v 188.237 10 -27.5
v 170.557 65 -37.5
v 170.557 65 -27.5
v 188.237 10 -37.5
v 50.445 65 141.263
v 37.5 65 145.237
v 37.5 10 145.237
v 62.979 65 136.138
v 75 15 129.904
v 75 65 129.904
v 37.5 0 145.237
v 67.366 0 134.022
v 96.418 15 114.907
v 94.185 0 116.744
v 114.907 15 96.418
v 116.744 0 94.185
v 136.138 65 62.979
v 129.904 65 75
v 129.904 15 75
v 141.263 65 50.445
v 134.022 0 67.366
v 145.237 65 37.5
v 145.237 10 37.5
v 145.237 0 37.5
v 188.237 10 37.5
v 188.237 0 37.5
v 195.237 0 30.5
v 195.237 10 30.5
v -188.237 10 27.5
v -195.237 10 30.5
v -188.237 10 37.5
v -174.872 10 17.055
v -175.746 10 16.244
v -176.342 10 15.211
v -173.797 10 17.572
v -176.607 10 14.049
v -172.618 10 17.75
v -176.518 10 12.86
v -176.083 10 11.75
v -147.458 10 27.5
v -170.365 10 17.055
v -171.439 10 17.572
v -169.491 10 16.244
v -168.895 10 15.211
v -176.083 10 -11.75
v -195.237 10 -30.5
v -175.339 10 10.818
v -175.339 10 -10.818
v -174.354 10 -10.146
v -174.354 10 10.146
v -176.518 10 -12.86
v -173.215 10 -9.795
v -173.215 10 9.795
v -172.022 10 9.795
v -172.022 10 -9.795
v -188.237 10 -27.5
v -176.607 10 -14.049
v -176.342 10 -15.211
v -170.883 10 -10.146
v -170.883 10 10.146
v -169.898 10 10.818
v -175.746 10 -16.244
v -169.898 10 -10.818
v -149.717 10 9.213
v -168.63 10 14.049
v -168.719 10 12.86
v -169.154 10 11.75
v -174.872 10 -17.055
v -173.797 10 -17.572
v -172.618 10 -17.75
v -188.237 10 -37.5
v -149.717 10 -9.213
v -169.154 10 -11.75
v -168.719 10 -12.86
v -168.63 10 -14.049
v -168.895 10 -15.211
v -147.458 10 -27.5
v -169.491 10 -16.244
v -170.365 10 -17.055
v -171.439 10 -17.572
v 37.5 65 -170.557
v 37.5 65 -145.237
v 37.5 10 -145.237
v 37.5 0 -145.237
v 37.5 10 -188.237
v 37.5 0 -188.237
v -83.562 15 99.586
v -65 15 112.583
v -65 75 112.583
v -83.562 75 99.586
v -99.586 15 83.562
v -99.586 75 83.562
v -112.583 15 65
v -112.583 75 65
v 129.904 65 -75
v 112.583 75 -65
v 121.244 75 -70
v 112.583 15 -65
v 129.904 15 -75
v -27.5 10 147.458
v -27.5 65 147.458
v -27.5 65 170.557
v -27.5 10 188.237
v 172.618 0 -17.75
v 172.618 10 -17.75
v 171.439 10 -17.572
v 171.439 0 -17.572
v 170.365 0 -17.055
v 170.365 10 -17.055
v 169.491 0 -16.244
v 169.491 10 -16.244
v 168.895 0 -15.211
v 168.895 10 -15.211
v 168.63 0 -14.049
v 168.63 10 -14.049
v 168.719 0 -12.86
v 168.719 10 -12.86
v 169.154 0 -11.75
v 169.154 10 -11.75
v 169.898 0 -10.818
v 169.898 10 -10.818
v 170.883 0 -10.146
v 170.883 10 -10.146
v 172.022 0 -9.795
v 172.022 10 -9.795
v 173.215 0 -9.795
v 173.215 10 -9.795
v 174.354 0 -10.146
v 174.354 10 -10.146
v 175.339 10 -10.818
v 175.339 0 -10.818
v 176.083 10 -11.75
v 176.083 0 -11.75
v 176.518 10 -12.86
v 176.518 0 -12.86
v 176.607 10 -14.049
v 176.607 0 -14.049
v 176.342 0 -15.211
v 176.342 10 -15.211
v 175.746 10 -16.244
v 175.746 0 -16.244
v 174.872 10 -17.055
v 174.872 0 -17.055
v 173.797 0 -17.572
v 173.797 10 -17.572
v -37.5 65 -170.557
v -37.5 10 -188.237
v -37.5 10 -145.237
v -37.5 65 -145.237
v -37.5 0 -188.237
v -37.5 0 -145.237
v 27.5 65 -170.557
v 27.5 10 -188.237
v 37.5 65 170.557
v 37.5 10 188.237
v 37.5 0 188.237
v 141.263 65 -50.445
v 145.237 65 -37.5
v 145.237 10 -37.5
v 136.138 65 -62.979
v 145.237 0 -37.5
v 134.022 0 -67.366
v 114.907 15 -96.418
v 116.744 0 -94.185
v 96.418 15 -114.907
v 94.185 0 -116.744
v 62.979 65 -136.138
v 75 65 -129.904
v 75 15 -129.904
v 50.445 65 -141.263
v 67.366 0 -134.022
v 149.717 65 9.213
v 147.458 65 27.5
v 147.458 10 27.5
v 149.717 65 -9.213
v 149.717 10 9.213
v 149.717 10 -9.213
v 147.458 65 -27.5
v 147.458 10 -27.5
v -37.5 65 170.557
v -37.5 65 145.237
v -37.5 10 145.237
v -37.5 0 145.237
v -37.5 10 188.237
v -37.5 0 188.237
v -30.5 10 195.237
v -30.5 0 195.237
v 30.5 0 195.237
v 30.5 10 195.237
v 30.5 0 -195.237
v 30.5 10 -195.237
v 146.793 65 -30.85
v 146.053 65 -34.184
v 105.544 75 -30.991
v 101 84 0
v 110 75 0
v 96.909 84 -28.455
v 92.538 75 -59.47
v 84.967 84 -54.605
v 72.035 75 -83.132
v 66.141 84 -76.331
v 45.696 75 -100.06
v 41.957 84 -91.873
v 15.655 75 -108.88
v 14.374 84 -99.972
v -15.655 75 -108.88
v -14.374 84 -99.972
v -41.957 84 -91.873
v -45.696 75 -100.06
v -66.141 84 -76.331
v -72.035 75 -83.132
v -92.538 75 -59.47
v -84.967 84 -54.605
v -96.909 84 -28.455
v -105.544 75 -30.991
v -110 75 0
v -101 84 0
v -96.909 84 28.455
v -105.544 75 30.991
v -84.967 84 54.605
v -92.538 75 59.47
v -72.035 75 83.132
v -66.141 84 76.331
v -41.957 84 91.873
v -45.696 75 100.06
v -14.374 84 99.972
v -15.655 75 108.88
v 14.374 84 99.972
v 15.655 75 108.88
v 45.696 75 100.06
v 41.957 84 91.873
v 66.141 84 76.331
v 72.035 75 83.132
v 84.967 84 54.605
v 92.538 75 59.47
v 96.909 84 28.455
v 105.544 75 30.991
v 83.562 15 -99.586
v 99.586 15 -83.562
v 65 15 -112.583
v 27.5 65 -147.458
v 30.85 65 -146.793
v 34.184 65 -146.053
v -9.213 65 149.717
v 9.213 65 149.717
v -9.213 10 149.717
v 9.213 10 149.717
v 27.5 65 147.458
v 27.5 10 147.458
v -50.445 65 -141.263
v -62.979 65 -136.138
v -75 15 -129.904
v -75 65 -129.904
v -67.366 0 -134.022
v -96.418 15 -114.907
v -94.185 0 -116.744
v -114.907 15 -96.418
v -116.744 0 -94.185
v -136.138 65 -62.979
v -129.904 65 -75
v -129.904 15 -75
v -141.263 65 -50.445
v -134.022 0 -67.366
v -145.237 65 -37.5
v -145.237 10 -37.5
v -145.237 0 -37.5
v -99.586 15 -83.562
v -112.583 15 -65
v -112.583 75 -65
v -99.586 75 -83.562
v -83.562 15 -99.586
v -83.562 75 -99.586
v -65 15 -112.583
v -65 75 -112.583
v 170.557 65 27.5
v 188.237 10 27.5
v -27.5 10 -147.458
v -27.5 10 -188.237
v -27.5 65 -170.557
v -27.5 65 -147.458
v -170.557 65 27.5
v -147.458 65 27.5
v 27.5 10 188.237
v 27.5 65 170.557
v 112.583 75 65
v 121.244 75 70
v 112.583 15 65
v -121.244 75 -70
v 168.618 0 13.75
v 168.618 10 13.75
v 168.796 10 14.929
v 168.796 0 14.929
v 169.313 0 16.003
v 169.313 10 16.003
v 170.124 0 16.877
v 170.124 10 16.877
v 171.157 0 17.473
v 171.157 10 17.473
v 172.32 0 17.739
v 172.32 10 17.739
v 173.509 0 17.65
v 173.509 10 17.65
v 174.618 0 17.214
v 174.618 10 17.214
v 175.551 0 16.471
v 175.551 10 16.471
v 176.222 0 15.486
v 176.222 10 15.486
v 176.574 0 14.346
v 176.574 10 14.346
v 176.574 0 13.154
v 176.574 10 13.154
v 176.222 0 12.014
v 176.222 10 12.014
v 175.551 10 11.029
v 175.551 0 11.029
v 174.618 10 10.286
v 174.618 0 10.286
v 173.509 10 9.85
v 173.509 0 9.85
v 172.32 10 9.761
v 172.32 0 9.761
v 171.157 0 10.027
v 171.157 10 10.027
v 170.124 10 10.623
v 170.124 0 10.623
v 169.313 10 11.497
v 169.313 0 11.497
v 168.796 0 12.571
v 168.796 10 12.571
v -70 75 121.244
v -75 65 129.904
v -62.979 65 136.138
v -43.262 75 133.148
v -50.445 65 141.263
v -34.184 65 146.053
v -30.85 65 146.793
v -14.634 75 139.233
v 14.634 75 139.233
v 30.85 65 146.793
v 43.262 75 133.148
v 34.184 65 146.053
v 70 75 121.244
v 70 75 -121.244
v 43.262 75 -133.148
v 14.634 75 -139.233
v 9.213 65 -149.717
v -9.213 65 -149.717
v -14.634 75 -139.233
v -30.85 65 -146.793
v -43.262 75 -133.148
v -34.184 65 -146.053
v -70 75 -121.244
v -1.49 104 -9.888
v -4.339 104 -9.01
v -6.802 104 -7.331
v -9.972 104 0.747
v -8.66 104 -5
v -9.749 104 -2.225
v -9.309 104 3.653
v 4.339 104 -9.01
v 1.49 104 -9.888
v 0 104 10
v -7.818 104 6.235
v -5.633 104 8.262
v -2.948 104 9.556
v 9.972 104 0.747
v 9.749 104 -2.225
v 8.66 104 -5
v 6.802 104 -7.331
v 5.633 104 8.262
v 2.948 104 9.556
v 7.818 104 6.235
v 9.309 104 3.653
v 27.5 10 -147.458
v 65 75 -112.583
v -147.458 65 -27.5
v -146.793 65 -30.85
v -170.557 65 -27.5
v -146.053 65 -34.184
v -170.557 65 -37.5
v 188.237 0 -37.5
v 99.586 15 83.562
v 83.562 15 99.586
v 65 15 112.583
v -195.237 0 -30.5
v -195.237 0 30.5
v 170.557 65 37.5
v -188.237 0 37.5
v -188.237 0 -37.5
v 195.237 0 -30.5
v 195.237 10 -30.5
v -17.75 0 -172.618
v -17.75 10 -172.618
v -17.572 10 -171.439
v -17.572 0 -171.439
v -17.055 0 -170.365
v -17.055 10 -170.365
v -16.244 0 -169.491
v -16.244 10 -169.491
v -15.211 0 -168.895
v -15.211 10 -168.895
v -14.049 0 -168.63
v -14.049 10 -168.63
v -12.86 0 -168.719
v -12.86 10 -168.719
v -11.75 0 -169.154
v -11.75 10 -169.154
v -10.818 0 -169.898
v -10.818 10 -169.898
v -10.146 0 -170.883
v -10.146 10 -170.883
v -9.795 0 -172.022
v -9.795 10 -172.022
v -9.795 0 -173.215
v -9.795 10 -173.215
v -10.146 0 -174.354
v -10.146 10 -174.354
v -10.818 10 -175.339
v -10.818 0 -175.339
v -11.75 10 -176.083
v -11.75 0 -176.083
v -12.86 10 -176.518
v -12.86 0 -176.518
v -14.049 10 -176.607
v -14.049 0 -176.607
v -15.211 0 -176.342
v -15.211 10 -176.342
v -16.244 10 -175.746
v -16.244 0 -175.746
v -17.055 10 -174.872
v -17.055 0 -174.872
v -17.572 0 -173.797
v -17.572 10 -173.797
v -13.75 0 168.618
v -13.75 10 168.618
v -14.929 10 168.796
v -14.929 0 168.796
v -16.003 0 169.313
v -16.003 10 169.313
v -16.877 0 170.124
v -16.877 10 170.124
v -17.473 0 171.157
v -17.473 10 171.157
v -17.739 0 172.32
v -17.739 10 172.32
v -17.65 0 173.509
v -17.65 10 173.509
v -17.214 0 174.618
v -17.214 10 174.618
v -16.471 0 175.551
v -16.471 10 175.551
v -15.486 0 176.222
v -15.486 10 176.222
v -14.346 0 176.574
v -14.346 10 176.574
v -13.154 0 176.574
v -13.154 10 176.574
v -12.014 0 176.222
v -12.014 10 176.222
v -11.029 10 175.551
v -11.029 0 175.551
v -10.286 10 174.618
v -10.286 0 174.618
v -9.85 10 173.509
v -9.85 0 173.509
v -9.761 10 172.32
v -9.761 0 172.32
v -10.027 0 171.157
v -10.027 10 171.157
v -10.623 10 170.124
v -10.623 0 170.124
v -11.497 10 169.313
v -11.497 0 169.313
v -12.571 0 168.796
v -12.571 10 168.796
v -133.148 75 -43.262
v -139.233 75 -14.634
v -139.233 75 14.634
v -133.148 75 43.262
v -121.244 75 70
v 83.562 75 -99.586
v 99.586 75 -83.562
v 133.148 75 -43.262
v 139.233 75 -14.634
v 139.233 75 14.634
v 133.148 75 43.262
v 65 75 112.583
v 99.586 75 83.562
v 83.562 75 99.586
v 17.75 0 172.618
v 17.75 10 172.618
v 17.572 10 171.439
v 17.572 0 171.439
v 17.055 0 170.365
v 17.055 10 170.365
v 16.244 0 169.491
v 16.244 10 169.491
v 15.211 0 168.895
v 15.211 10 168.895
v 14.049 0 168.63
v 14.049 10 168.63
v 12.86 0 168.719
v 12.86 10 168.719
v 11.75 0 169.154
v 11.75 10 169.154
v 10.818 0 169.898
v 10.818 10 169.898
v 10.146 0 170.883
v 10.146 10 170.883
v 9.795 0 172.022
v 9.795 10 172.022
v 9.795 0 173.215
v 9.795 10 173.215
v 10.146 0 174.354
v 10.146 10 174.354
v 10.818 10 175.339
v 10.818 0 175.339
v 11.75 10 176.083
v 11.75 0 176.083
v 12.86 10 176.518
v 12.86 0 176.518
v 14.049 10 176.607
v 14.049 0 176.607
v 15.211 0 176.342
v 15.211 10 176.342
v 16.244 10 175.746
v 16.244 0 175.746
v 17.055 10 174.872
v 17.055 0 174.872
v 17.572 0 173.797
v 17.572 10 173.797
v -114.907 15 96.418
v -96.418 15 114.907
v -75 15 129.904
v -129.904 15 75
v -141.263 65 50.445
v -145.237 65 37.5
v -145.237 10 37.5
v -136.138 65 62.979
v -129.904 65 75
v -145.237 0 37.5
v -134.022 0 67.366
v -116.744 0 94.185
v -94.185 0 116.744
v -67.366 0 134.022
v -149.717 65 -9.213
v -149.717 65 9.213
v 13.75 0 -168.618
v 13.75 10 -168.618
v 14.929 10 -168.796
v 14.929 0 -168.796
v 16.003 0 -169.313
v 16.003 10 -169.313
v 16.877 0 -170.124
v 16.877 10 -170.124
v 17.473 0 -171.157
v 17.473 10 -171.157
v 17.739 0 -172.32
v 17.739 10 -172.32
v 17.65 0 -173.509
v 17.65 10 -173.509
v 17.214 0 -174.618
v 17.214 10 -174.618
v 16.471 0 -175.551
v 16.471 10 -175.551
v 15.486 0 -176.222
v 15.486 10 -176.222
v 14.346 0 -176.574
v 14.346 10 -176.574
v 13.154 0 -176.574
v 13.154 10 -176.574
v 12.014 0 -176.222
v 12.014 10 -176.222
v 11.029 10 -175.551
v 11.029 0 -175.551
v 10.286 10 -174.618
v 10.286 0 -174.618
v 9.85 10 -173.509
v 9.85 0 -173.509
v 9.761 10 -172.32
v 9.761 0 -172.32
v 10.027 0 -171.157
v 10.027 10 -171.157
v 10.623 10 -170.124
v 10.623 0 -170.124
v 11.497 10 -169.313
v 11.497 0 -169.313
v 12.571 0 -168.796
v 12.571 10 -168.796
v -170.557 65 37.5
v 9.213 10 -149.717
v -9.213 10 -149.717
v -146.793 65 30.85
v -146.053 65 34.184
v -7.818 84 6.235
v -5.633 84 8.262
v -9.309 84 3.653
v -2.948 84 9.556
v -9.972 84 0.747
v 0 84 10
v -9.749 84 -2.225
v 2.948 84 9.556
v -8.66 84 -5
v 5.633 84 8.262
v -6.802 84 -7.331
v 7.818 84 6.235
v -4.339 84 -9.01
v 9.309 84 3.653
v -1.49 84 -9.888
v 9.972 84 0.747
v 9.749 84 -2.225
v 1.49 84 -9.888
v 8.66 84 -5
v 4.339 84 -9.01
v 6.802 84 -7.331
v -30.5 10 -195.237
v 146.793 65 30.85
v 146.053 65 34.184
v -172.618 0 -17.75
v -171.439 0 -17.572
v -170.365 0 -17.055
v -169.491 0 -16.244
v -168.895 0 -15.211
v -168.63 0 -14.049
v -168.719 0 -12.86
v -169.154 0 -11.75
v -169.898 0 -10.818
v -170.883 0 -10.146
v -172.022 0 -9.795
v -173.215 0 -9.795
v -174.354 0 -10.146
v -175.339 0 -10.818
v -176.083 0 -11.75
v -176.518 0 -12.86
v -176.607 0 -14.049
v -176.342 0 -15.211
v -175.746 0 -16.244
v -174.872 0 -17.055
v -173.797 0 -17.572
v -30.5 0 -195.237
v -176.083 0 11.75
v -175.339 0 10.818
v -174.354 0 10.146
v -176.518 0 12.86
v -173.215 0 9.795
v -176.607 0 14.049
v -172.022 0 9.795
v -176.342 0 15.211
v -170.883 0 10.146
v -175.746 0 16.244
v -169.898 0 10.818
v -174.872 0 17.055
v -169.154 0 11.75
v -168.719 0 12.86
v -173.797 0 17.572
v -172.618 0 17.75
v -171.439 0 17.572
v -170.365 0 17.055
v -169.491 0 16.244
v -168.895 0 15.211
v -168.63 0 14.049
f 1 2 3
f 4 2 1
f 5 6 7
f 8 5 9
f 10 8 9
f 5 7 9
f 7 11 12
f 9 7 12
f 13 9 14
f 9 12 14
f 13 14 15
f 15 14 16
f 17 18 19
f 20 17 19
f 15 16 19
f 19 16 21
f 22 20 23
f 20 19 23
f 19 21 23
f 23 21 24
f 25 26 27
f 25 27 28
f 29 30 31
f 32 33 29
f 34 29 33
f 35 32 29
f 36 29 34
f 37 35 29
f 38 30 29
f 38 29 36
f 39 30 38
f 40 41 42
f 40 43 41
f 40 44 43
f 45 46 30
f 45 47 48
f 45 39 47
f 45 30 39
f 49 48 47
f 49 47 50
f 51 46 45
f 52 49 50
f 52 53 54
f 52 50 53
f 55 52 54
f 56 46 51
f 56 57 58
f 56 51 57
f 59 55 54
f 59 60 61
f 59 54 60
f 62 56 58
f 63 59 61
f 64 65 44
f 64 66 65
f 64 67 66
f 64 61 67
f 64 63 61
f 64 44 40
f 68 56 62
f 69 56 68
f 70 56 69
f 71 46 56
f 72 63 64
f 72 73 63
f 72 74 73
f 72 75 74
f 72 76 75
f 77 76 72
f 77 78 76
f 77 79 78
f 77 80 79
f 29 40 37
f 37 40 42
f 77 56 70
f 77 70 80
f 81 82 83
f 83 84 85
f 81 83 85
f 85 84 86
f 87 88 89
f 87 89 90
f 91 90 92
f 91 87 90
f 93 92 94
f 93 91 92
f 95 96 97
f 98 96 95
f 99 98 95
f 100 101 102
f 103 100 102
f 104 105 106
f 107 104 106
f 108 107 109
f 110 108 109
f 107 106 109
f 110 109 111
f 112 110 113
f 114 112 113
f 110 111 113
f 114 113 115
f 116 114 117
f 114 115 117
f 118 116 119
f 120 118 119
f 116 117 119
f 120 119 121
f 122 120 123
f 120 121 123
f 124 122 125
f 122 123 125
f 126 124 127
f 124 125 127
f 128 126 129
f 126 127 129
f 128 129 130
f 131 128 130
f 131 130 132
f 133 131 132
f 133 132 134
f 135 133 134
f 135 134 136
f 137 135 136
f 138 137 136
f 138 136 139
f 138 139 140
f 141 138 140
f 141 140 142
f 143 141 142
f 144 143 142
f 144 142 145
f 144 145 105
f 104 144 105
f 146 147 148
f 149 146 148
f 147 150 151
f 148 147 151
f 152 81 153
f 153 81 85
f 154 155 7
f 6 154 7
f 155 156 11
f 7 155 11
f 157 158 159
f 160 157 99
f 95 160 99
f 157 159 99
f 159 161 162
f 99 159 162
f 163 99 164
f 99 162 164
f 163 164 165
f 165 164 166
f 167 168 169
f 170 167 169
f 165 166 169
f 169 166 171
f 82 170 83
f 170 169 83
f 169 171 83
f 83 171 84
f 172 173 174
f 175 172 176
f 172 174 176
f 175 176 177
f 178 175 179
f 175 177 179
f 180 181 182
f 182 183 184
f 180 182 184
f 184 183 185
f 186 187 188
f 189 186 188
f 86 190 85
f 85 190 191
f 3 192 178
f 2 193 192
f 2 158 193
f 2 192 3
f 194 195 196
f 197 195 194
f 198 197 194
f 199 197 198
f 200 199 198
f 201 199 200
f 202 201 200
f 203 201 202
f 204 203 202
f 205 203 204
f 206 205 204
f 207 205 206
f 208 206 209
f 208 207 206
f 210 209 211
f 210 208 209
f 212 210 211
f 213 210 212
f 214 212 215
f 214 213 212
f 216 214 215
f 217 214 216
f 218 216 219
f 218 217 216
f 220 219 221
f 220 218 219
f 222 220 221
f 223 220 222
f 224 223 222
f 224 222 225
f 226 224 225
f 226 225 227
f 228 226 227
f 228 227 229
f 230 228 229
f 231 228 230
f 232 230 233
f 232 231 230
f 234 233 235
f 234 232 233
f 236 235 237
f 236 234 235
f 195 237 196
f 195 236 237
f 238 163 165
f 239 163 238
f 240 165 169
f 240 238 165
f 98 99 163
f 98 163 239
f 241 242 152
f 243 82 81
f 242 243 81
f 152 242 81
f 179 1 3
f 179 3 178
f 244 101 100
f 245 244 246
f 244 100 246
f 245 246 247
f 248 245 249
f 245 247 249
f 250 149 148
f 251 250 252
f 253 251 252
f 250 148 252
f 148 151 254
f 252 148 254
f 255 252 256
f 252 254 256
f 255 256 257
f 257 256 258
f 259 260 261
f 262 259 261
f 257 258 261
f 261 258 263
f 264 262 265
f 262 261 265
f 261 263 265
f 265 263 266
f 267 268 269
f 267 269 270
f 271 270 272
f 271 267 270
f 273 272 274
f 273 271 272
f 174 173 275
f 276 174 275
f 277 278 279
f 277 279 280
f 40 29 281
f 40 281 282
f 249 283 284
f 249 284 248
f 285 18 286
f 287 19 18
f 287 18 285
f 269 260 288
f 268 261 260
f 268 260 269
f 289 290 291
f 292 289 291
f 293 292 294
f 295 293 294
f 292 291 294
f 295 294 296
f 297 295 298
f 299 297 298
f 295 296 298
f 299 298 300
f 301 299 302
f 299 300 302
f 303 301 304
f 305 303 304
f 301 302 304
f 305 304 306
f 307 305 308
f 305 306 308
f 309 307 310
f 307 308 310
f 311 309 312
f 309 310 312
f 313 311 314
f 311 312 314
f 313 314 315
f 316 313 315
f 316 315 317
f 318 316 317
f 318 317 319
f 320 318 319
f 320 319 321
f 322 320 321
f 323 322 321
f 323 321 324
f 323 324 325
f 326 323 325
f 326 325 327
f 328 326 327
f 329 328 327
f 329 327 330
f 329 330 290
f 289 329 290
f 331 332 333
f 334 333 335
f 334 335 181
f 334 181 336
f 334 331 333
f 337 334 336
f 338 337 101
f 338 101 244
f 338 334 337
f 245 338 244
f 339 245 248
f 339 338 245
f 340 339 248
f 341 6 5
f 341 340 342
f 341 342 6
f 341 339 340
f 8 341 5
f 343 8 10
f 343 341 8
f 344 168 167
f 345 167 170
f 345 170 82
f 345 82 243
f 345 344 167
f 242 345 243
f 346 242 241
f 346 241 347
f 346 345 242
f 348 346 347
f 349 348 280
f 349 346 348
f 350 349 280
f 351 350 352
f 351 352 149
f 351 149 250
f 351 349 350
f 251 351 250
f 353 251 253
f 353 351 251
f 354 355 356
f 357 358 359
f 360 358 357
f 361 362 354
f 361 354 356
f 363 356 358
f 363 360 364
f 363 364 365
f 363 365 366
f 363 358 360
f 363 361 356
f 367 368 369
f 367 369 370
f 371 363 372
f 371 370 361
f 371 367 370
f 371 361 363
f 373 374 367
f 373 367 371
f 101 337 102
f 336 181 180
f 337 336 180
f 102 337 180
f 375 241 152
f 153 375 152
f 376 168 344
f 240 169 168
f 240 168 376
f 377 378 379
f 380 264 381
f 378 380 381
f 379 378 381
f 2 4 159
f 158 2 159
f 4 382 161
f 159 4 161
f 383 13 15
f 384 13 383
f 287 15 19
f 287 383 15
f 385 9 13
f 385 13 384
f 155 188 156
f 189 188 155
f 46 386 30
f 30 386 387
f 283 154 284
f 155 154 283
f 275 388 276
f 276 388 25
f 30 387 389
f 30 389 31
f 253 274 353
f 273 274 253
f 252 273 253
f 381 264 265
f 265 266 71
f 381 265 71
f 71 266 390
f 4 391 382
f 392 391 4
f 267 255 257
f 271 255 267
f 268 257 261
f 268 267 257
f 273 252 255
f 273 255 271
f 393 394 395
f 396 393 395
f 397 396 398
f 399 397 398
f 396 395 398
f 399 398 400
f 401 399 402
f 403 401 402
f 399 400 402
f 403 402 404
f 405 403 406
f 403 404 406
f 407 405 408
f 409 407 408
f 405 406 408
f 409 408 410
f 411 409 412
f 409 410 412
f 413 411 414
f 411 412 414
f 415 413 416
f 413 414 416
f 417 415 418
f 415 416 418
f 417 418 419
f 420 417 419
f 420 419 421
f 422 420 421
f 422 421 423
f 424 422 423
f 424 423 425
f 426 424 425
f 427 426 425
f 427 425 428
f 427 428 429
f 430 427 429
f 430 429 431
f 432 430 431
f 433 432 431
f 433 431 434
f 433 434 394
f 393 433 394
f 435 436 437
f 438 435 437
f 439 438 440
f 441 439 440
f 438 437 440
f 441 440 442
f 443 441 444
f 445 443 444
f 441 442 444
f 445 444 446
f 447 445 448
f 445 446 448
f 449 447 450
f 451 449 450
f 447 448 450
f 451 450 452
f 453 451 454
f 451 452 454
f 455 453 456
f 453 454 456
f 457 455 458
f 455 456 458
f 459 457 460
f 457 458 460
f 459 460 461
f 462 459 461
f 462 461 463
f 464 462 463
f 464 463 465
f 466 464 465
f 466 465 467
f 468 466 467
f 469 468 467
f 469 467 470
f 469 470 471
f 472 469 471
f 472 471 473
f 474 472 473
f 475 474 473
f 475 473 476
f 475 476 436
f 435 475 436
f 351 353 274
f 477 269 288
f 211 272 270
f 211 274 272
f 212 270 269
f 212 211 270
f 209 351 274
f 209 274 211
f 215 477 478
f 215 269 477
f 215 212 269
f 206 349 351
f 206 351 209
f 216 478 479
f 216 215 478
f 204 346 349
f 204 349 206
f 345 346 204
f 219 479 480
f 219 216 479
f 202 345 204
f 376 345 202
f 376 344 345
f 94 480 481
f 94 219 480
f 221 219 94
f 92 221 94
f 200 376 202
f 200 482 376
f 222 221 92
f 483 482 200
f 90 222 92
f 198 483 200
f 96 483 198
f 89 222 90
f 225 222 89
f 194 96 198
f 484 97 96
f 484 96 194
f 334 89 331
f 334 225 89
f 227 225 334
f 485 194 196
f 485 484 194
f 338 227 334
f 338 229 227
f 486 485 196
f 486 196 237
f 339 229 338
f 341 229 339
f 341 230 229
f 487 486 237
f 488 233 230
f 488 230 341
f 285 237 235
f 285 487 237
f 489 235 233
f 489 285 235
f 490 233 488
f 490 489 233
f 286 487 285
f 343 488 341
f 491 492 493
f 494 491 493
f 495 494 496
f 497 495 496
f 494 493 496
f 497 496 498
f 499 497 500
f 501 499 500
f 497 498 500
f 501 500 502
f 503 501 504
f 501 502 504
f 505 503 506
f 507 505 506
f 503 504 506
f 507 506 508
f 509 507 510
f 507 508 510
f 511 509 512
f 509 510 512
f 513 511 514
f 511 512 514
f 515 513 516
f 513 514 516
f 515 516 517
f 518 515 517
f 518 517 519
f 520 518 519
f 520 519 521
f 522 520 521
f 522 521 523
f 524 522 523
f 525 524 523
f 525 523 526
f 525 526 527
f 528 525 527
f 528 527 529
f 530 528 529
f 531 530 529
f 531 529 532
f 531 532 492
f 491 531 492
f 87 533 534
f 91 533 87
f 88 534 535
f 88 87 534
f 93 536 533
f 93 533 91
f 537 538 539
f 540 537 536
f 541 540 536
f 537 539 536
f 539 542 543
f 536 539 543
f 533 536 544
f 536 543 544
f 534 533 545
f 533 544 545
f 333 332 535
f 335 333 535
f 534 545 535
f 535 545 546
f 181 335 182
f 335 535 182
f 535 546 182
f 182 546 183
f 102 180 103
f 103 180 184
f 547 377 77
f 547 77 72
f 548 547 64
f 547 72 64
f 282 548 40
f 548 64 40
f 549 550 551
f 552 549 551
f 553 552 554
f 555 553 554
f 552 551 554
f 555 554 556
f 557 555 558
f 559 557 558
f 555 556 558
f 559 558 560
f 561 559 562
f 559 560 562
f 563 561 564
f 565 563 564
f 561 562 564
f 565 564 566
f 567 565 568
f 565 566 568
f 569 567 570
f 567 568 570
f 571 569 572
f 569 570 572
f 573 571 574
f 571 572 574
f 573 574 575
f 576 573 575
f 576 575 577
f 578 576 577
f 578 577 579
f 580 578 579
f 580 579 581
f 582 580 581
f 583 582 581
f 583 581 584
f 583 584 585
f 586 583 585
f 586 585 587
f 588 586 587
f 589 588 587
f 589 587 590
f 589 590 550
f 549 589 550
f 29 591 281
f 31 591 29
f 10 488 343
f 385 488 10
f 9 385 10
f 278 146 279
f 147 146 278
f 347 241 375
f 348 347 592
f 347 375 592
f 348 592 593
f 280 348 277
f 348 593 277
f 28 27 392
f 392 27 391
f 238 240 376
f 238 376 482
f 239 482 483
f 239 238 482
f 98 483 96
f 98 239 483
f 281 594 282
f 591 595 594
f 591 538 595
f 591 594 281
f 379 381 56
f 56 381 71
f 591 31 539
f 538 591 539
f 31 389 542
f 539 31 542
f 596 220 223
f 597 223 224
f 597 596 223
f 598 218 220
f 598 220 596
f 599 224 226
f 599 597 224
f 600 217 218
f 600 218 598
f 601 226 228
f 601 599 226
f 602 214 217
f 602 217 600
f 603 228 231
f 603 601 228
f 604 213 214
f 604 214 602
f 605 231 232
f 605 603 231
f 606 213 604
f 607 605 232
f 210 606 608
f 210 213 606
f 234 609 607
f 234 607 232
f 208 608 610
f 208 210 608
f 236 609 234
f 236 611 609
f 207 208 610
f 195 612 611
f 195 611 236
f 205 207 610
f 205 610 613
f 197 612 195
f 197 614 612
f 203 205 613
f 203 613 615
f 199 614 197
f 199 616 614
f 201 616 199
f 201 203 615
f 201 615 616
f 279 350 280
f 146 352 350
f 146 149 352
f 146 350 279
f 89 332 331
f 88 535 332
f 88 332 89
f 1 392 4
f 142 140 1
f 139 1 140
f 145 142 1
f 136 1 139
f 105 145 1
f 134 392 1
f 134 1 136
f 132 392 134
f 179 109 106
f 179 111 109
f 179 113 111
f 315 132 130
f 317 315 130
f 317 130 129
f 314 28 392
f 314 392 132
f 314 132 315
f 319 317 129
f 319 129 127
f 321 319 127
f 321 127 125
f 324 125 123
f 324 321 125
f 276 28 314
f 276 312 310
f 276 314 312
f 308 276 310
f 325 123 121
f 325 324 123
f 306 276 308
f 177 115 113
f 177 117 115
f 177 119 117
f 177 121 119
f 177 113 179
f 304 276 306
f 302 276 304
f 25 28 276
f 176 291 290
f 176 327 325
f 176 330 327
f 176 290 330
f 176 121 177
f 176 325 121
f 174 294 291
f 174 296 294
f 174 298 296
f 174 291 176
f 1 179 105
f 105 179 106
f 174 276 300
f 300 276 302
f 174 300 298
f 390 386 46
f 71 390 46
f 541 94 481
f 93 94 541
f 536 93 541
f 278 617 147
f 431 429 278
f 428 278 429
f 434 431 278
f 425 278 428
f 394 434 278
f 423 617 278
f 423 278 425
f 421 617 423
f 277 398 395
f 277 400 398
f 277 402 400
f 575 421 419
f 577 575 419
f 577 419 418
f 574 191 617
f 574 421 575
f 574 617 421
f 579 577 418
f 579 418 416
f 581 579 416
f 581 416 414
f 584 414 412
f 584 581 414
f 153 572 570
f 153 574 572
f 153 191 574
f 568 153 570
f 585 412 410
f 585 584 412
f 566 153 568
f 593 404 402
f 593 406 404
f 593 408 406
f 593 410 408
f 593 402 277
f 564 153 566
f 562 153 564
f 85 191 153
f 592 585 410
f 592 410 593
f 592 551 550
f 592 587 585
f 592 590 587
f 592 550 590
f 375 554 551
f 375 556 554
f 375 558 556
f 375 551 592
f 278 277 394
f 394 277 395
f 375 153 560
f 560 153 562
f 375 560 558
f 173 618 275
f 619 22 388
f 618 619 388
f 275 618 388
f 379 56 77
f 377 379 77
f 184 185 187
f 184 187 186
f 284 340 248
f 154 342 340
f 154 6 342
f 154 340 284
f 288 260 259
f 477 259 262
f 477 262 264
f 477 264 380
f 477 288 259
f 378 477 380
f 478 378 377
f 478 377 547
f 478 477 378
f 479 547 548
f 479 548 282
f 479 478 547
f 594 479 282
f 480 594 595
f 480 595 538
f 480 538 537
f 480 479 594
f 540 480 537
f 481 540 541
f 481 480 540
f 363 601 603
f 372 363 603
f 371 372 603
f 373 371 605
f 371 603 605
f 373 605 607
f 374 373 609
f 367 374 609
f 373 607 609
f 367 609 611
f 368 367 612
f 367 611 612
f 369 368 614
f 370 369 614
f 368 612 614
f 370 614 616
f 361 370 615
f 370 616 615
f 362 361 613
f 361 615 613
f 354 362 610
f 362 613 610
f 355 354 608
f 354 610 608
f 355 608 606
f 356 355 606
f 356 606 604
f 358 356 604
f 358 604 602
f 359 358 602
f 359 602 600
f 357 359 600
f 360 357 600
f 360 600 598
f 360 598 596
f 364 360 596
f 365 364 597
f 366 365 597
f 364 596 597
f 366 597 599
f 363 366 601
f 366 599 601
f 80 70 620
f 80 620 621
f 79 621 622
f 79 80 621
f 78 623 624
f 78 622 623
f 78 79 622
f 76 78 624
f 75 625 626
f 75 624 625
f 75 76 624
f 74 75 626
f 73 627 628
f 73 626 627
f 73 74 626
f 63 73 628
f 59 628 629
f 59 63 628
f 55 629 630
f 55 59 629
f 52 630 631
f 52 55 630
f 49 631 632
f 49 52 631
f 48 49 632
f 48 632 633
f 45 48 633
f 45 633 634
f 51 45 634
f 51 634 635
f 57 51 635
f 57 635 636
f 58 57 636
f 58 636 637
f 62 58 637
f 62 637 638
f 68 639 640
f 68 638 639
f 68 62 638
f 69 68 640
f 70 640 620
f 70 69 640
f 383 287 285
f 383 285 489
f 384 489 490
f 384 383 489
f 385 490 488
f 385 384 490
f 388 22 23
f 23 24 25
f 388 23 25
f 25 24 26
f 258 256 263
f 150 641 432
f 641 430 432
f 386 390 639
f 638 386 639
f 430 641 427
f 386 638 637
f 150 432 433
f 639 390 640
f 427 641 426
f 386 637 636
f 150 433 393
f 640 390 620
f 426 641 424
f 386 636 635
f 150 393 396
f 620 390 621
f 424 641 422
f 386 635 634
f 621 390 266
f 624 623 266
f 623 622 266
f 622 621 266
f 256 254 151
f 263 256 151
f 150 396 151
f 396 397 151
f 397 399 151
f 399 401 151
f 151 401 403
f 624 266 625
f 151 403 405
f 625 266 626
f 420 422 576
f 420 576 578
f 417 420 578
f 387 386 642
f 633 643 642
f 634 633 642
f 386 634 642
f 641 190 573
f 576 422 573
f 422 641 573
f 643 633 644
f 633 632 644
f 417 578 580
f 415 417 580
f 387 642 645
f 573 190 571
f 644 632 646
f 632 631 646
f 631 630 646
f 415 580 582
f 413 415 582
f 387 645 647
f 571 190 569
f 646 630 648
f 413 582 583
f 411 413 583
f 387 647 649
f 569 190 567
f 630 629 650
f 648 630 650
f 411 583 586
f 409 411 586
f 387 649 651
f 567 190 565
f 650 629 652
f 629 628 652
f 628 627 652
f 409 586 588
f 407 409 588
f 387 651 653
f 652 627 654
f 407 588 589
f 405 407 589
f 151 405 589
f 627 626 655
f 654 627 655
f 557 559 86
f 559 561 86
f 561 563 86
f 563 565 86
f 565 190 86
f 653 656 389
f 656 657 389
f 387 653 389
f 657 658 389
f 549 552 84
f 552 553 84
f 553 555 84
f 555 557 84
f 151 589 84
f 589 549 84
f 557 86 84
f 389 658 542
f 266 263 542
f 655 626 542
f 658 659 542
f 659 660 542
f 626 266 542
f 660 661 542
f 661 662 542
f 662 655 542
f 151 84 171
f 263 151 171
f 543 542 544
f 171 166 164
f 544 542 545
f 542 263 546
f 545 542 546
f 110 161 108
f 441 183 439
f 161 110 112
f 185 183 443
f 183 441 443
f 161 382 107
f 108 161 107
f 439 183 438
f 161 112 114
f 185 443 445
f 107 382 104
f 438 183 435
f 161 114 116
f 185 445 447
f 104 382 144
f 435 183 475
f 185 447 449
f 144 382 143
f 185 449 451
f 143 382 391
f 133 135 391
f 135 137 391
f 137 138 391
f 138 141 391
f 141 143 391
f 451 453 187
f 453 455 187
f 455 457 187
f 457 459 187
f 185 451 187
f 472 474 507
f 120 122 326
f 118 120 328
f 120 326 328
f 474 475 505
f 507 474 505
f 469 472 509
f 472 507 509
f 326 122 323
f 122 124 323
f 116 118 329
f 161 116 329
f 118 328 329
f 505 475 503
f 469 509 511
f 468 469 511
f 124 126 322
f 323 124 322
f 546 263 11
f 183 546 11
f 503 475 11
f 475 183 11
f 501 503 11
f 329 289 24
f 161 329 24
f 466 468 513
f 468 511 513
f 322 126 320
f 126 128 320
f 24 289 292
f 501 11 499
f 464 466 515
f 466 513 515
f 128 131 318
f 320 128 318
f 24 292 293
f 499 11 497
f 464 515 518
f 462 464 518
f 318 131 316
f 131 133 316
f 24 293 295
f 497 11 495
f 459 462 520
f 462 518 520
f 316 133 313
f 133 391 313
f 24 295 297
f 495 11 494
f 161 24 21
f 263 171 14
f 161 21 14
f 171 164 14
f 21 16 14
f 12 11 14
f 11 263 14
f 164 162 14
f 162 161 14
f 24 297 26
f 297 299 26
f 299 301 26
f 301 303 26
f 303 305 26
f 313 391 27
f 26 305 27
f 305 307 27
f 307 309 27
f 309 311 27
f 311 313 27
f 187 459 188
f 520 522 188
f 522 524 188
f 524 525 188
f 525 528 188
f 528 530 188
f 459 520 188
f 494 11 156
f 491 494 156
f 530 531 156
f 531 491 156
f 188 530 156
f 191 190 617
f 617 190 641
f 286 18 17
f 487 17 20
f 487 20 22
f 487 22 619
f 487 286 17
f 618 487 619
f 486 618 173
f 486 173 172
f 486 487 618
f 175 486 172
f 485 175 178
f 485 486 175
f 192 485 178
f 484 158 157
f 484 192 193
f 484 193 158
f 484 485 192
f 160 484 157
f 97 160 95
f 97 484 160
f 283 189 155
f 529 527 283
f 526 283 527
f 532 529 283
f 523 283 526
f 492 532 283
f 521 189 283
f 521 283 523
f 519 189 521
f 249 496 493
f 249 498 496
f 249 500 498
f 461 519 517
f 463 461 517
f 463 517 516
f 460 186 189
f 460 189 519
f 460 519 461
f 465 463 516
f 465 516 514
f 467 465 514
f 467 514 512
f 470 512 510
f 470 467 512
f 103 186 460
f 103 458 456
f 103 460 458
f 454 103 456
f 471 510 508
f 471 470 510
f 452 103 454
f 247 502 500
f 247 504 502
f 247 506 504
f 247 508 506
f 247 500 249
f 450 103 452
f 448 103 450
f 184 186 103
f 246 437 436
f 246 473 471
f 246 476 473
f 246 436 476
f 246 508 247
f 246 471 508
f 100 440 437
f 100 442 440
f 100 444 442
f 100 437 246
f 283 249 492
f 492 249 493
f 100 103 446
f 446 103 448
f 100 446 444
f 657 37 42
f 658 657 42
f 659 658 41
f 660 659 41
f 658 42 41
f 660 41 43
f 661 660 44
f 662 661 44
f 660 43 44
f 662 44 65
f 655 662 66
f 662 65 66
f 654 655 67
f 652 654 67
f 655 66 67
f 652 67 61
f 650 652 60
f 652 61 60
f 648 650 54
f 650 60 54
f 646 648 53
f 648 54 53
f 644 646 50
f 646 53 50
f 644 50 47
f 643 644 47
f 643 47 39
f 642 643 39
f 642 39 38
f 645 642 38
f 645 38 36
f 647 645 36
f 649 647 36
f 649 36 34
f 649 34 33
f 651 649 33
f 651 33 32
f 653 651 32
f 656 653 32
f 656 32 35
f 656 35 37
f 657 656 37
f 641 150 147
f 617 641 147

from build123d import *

# Parameters (mm, degrees)
SKETCH1_R                    = 150
BOSS_EXTRUDE1_DEPTH          = 75
CHAMFER1_SIZE                = 10
BOSS_EXTRUDE3_START          = -75
BOSS_EXTRUDE3_DEPTH          = 10
CHAMFER2_SIZE                = 7
BOSS_EXTRUDE4_DEPTH          = 10
SKETCH4_R                    = 4
CUT_EXTRUDE1_DEPTH           = 258.376062501
CIRPATTERN1_COUNT            = 4
CIRPATTERN1_COPY_1_DEPTH     = 10
CIRPATTERN1_COPY_2_DEPTH     = 10
CIRPATTERN1_COPY_3_DEPTH     = 10
CIRPATTERN1_COPY_4_SKETCH_R  = 4
CIRPATTERN1_COPY_4_DEPTH     = 258.376062501
CIRPATTERN1_COPY_5_SKETCH_R  = 4
CIRPATTERN1_COPY_5_DEPTH     = 258.376062501
CIRPATTERN1_COPY_6_SKETCH_R  = 4
CIRPATTERN1_COPY_6_DEPTH     = 258.376062501
CHAMFER2_OF_CIRPATTERN1_SIZE = 7
CUT_EXTRUDE2_START           = -60
CUT_EXTRUDE2_DEPTH           = 60
CIRPATTERN2_COUNT            = 4
SKETCH7_R                    = 110
BOSS_EXTRUDE5_DEPTH          = 9
BOSS_EXTRUDE5_TAPER          = 45
SKETCH8_R                    = 10
BOSS_EXTRUDE6_DEPTH          = 20


with BuildPart() as part:
    # Sketch1 → Boss-Extrude1 (new body)
    with BuildSketch(Plane(origin=(0, 0, 0), x_dir=(1, 0, 0), z_dir=(0, 1, 0))):
        with Locations(Location((0, 0, 0), (0, 0, 270))):
            Circle(SKETCH1_R)
    extrude(amount=BOSS_EXTRUDE1_DEPTH)

    # Chamfer1
    chamfer1_edges = [part.edges().sort_by_distance(p)[0] for p in [
        (0, 75, -150),
    ]]
    chamfer(chamfer1_edges, length=CHAMFER1_SIZE)

    # Sketch2 → Boss-Extrude3 (add)
    with BuildSketch(Plane(origin=(0, 75, 0), x_dir=(1, 0, 0), z_dir=(0, 1, 0)).offset(BOSS_EXTRUDE3_START)):
        with BuildLine():
            Line((-195.236875483, 37.5), (-195.236875483, -37.5))
            Line((-195.236875483, -37.5), (-145.236875483, -37.5))
            ThreePointArc((-145.236875483, -37.5), (-150, 0), (-145.236875483, 37.5))
            Line((-145.236875483, 37.5), (-195.236875483, 37.5))
        make_face()
    boss_extrude3 = extrude(amount=BOSS_EXTRUDE3_DEPTH)

    # Chamfer2
    chamfer2_edges = [part.edges().sort_by_distance(p)[0] for p in [
        (-195.236875483, 5, -37.5),
        (-195.236875483, 5, 37.5),
    ]]
    chamfer(chamfer2_edges, length=CHAMFER2_SIZE)

    # Sketch3 → Boss-Extrude4 (add)
    with BuildSketch(Plane.XY.offset(37.5)):
        Polygon((-144.19716267, 65), (-170.556875483, 65), (-188.236875483, 10), (-188.236875483, 0), (-145.236875483, 0), align=None)
    boss_extrude4 = extrude(amount=-BOSS_EXTRUDE4_DEPTH)

    # Sketch4 → Cut-Extrude1 (cut, through all)
    with BuildSketch(Plane(origin=(0, 75, 0), x_dir=(1, 0, 0), z_dir=(0, 1, 0))):
        with Locations(Location((-172.618437741, -13.75, 0), (0, 0, 270))):
            Circle(SKETCH4_R)
    cut_extrude1 = extrude(amount=-CUT_EXTRUDE1_DEPTH, mode=Mode.SUBTRACT)

    # Mirror3: Boss-Extrude4, Cut-Extrude1 across plane
    add(boss_extrude4.mirror(Plane.XY))
    add(cut_extrude1.mirror(Plane.XY), mode=Mode.SUBTRACT)

    # CirPattern1: Boss-Extrude3, Boss-Extrude4, Cut-Extrude1 ×4 about axis
    cirpattern1_axis = Axis((0, 0, 0), (0, 1, 0))
    add([boss_extrude3.rotate(cirpattern1_axis, i * 360 / CIRPATTERN1_COUNT) for i in range(1, CIRPATTERN1_COUNT)])
    add([boss_extrude4.rotate(cirpattern1_axis, i * 360 / CIRPATTERN1_COUNT) for i in range(1, CIRPATTERN1_COUNT)])
    add([cut_extrude1.rotate(cirpattern1_axis, i * 360 / CIRPATTERN1_COUNT) for i in range(1, CIRPATTERN1_COUNT)], mode=Mode.SUBTRACT)

    # CirPattern1 copy 1 sketch → CirPattern1 copy 1 (add)
    with BuildSketch(Plane(origin=(-37.5, 0, 0), x_dir=(0, 0, -1), z_dir=(-1, 0, 0))):
        Polygon((-144.19716267, -65), (-170.556875483, -65), (-188.236875483, -10), (-188.236875483, 0), (-145.236875483, 0), align=None)
    extrude(amount=-CIRPATTERN1_COPY_1_DEPTH)

    # CirPattern1 copy 2 sketch → CirPattern1 copy 2 (add)
    with BuildSketch(Plane(origin=(0, 0, 37.5), x_dir=(-1, 0, 0), z_dir=(0, 0, 1))):
        Polygon((-144.19716267, -65), (-170.556875483, -65), (-188.236875483, -10), (-188.236875483, 0), (-145.236875483, 0), align=None)
    extrude(amount=-CIRPATTERN1_COPY_2_DEPTH)

    # CirPattern1 copy 3 sketch → CirPattern1 copy 3 (add)
    with BuildSketch(Plane(origin=(37.5, 0, 0), x_dir=(0, 0, 1), z_dir=(1, 0, 0))):
        Polygon((-144.19716267, -65), (-170.556875483, -65), (-188.236875483, -10), (-188.236875483, 0), (-145.236875483, 0), align=None)
    extrude(amount=-CIRPATTERN1_COPY_3_DEPTH)

    # CirPattern1 copy 4 sketch → CirPattern1 copy 4 (cut, through all)
    with BuildSketch(Plane(origin=(0, 75, 0), x_dir=(0, 0, -1), z_dir=(0, 1, 0))):
        with Locations((-172.618437741, 13.75)):
            Circle(CIRPATTERN1_COPY_4_SKETCH_R)
    extrude(amount=-CIRPATTERN1_COPY_4_DEPTH, mode=Mode.SUBTRACT)

    # CirPattern1 copy 5 sketch → CirPattern1 copy 5 (cut, through all)
    with BuildSketch(Plane(origin=(0, 75, 0), x_dir=(-1, 0, 0), z_dir=(0, 1, 0))):
        with Locations((-172.618437741, 13.75)):
            Circle(CIRPATTERN1_COPY_5_SKETCH_R)
    extrude(amount=-CIRPATTERN1_COPY_5_DEPTH, mode=Mode.SUBTRACT)

    # CirPattern1 copy 6 sketch → CirPattern1 copy 6 (cut, through all)
    with BuildSketch(Plane.ZX.offset(75)):
        with Locations((-172.618437741, 13.75)):
            Circle(CIRPATTERN1_COPY_6_SKETCH_R)
    extrude(amount=-CIRPATTERN1_COPY_6_DEPTH, mode=Mode.SUBTRACT)

    # Chamfer2 of CirPattern1
    chamfer2_of_cirpattern1_edges = [part.edges().sort_by_distance(p)[0] for p in [
        (-37.5, 5, 195.236875483),
        (37.5, 5, 195.236875483),
        (195.236875483, 5, 37.5),
        (195.236875483, 5, -37.5),
        (37.5, 5, -195.236875483),
        (-37.5, 5, -195.236875483),
    ]]
    chamfer(chamfer2_of_cirpattern1_edges, length=CHAMFER2_OF_CIRPATTERN1_SIZE)

    # Sketch6 → Cut-Extrude2 (cut)
    with BuildSketch(Plane(origin=(0, 75, 0), x_dir=(1, 0, 0), z_dir=(0, 1, 0)).offset(CUT_EXTRUDE2_START)):
        with BuildLine():
            Line((-112.583302492, -65), (-129.903810568, -75))
            ThreePointArc((-129.903810568, -75), (-106.066017178, -106.066017178), (-75, -129.903810568))
            Line((-75, -129.903810568), (-65, -112.583302492))
            ThreePointArc((-65, -112.583302492), (-91.923881554, -91.923881554), (-112.583302492, -65))
        make_face()
    cut_extrude2 = extrude(amount=CUT_EXTRUDE2_DEPTH, mode=Mode.SUBTRACT)

    # CirPattern2: Cut-Extrude2 ×4 about axis
    cirpattern2_axis = Axis((0, 75, 0), (0, 1, 0))
    for i in range(1, CIRPATTERN2_COUNT):
        add(cut_extrude2.rotate(cirpattern2_axis, i * 360 / CIRPATTERN2_COUNT), mode=Mode.SUBTRACT)

    # Sketch7 → Boss-Extrude5 (add)
    with BuildSketch(Plane(origin=(0, 75, 0), x_dir=(1, 0, 0), z_dir=(0, 1, 0))):
        Circle(SKETCH7_R)
    extrude(amount=BOSS_EXTRUDE5_DEPTH, taper=BOSS_EXTRUDE5_TAPER)

    # Sketch8 → Boss-Extrude6 (add)
    with BuildSketch(Plane(origin=(0, 84, 0), x_dir=(1, 0, 0), z_dir=(0, 1, 0))):
        with Locations(Location((0, 0, 0), (0, 0, 270))):
            Circle(SKETCH8_R)
    extrude(amount=BOSS_EXTRUDE6_DEPTH)


solid = part.part
